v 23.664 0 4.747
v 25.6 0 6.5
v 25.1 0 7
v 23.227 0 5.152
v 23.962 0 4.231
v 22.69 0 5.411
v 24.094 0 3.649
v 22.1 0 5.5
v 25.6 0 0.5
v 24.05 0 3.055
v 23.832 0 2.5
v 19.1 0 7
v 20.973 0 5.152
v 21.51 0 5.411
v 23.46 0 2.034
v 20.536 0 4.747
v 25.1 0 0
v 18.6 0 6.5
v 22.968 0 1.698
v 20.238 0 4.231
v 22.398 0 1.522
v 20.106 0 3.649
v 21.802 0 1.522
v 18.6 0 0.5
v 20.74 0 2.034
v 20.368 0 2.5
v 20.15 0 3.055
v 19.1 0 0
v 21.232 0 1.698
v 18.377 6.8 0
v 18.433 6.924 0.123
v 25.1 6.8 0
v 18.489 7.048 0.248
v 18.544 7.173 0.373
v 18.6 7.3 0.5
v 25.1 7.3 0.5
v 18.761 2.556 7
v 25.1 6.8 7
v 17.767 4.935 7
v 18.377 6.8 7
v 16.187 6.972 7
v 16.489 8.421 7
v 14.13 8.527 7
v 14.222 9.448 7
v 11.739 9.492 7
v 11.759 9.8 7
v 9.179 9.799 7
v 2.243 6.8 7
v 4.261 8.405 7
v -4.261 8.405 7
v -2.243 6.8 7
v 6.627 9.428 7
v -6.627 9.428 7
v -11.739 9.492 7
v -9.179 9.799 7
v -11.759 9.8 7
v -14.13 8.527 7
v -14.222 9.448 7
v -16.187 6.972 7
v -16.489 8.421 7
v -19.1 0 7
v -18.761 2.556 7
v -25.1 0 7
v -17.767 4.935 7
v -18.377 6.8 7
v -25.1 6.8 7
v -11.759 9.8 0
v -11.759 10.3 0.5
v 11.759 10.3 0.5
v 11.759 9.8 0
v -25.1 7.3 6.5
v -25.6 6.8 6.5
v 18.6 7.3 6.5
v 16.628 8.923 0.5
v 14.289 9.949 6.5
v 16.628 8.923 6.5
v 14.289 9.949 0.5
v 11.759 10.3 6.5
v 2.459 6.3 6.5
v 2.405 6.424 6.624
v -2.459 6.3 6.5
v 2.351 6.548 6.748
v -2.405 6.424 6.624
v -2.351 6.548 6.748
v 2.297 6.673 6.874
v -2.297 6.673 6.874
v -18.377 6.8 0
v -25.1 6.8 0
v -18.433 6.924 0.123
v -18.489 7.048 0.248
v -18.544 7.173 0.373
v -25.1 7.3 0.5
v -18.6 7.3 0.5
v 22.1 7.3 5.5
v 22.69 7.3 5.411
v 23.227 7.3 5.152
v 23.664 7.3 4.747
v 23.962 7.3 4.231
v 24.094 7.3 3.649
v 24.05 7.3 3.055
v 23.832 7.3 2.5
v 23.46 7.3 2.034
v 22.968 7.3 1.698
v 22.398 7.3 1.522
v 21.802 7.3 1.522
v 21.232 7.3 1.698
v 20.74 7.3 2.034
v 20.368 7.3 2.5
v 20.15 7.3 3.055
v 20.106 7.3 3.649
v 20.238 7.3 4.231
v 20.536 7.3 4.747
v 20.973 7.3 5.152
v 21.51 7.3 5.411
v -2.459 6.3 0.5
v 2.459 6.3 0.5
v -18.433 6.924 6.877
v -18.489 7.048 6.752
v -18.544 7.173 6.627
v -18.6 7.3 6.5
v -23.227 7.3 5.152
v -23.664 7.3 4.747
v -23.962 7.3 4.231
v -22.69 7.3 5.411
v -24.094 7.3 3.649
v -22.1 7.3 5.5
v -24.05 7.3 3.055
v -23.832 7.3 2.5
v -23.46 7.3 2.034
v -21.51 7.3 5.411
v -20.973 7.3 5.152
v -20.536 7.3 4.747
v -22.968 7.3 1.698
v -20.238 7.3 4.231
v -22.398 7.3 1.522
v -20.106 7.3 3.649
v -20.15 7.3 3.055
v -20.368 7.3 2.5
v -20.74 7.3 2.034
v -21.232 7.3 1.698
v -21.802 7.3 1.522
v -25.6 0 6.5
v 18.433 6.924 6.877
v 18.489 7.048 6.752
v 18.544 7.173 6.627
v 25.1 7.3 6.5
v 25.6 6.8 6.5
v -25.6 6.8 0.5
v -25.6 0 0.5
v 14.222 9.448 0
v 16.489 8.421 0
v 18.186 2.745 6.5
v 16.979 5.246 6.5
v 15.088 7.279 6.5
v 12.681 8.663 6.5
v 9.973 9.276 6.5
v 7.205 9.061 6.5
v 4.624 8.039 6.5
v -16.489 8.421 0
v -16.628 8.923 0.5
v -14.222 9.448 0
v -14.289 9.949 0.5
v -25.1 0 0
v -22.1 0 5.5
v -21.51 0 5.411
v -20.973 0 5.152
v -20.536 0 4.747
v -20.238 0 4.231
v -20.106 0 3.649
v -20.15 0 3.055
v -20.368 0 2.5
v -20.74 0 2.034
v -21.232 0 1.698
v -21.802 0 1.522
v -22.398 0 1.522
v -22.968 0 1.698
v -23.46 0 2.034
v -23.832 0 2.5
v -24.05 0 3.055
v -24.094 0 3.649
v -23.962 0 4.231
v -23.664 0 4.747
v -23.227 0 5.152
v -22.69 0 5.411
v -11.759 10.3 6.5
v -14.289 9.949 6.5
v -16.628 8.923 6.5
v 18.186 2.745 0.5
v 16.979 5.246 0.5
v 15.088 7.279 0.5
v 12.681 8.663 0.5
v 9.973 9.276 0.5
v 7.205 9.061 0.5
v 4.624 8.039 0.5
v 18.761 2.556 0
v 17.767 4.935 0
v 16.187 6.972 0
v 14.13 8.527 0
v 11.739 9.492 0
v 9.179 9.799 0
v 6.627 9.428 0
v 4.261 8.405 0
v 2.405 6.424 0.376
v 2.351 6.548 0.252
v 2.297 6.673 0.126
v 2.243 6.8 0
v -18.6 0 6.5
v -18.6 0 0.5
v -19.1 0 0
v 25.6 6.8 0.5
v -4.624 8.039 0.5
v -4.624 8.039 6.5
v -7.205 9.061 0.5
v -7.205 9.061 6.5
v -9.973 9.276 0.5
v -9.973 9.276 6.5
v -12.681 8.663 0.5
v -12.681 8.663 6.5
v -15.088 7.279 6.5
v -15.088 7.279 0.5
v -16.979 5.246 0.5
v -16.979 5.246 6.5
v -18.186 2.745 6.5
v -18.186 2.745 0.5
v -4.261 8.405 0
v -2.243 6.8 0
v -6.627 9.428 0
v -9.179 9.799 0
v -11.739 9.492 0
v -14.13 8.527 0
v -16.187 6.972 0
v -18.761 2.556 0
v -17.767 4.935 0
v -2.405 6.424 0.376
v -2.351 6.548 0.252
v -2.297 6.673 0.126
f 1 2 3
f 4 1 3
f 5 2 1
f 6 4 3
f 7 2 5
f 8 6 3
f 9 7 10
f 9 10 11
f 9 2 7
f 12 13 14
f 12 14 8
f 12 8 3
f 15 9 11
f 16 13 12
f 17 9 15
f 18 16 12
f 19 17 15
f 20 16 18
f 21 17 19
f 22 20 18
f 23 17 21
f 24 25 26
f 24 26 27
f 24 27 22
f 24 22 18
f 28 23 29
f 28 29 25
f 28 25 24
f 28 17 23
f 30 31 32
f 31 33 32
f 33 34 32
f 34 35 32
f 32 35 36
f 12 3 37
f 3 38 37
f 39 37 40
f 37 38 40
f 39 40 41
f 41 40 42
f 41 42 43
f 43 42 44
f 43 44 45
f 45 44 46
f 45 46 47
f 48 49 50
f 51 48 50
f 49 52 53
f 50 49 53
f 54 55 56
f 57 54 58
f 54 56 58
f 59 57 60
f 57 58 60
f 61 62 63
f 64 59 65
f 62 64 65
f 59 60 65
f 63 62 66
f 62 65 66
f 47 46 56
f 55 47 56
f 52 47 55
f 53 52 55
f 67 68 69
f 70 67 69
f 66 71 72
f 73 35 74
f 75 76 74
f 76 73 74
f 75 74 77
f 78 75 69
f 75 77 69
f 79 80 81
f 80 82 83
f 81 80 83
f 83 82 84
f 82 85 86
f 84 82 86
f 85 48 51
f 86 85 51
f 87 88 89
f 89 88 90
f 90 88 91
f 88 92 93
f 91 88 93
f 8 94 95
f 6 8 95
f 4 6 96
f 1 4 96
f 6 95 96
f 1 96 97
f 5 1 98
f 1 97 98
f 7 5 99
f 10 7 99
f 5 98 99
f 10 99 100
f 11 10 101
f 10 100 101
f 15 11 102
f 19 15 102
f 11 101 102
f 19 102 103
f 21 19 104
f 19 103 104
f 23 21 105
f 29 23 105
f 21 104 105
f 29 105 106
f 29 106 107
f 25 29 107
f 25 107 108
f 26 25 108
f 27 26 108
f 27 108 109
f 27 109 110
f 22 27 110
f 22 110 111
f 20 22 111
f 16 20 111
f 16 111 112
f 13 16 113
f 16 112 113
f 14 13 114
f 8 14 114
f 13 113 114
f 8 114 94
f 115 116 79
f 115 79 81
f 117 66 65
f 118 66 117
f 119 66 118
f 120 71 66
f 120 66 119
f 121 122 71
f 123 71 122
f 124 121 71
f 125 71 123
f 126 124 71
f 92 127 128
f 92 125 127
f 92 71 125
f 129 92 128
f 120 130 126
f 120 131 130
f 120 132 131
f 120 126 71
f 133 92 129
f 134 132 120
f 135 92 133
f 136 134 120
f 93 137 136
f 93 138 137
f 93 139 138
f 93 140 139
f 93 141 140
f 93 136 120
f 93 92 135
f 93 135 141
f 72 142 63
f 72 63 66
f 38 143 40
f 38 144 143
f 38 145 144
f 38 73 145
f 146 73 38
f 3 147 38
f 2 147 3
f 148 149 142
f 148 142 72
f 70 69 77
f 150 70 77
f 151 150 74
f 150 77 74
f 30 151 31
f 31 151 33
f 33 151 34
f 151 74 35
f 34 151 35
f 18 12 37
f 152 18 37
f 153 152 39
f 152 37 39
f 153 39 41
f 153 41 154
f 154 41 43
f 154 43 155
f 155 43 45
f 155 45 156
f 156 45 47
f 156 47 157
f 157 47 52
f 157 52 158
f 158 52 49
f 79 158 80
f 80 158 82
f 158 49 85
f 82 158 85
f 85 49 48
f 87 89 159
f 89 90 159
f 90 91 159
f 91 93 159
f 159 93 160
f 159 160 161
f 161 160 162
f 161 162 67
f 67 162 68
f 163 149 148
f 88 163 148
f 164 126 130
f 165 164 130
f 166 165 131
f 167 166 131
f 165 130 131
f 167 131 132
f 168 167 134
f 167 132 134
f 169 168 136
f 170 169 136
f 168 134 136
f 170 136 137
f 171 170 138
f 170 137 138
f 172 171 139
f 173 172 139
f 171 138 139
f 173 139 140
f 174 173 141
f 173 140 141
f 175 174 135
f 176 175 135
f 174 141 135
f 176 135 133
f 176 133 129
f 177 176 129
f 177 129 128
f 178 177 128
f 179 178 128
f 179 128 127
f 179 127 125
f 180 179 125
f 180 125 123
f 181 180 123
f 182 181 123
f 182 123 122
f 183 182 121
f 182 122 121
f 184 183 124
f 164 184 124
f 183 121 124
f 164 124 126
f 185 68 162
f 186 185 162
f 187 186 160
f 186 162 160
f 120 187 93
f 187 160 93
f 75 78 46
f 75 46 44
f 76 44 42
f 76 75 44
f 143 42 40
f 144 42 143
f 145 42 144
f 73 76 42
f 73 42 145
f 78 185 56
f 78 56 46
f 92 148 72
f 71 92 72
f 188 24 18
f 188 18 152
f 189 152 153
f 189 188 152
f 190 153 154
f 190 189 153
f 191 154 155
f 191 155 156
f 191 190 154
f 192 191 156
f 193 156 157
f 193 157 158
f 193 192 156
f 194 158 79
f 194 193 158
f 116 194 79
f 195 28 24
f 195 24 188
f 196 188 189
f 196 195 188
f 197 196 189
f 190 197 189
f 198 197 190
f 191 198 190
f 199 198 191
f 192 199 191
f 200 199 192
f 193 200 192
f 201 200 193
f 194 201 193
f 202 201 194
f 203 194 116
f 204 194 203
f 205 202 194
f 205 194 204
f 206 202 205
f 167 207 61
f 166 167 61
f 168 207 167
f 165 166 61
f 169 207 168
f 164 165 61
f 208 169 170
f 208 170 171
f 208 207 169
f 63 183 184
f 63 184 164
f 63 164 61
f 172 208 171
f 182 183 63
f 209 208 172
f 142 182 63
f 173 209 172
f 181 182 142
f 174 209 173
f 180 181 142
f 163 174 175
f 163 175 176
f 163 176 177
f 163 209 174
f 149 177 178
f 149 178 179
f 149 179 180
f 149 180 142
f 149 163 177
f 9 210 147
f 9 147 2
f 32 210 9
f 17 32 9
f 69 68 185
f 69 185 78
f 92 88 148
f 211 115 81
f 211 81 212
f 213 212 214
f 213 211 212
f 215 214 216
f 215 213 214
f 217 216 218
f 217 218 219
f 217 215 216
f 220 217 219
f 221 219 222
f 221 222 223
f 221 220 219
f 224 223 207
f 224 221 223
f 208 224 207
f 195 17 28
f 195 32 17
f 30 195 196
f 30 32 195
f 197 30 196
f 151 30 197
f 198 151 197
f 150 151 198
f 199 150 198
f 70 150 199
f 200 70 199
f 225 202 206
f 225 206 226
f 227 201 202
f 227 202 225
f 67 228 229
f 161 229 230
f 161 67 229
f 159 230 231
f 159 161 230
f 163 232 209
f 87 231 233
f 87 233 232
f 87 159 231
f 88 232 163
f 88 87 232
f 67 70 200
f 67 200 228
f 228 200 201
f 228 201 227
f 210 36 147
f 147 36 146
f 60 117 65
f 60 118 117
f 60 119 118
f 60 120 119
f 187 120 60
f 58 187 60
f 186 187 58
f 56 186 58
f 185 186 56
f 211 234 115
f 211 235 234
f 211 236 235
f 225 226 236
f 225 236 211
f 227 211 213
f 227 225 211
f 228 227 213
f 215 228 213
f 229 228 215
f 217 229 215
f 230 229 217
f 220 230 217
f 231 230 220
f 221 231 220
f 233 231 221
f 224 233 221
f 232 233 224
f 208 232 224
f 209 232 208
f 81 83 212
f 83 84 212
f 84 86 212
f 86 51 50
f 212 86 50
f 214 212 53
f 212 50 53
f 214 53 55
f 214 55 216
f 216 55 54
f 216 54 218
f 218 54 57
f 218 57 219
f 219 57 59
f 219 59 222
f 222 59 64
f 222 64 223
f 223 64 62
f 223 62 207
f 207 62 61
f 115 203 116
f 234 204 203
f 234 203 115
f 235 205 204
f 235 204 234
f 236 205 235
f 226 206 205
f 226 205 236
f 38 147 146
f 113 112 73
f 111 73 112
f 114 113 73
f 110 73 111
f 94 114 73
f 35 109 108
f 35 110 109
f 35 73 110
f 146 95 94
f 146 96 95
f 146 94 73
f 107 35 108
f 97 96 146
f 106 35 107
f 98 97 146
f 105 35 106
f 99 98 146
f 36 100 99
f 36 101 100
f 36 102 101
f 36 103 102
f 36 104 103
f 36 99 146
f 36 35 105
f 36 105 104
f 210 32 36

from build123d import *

# Parameters (mm, degrees)
SALIENTE_EXTRUIR1_DEPTH = 7
CROQUIS2_R              = 2
CORTAR_EXTRUIR1_DEPTH   = 7.3
REDONDEO1_R             = 9.3
CHAFL_N1_SIZE           = 0.5


# Some blends are built 0.0001 mm under size
with BuildPart() as part:
    # Croquis1 → Saliente-Extruir1 (new body)
    with BuildSketch(Plane.XY):
        with BuildLine():
            Line((2.458947449, 6.3), (-2.458947449, 6.3))
            ThreePointArc((-2.458947449, 6.3), (-12.681435441, 8.663480499), (-18.6, 0))
            Line((-18.6, 0), (-25.6, 0))
            Line((-25.6, 0), (-25.6, 7.3))
            Line((-25.6, 7.3), (-18.6, 7.3))
            Line((-18.6, 7.3), (-18.6, 10.3))
            Line((-18.6, 10.3), (18.6, 10.3))
            Line((18.6, 10.3), (18.6, 7.3))
            Line((18.6, 7.3), (25.6, 7.3))
            Line((25.6, 7.3), (25.6, 0))
            Line((25.6, 0), (18.6, 0))
            ThreePointArc((18.6, 0), (12.681435441, 8.663480499), (2.458947449, 6.3))
        make_face()
    extrude(amount=SALIENTE_EXTRUIR1_DEPTH)

    # Croquis2 → Cortar-Extruir1 (cut)
    with BuildSketch(Plane(origin=(0, 7.3, 0), x_dir=(1, 0, 0), z_dir=(0, 1, 0))):
        with Locations(Location((22.1, -3.5, 0), (0, 0, 270))):
            Circle(CROQUIS2_R)
        with Locations(Location((-22.1, -3.5, 0), (0, 0, 270))):
            Circle(CROQUIS2_R)
    extrude(amount=-CORTAR_EXTRUIR1_DEPTH, mode=Mode.SUBTRACT)

    # Redondeo1
    # the kernel refuses this fillet: 9.3 mm, written as the material it takes off along each edge
    with BuildSketch(Plane(origin=(-18.6, 10.3, -17.102631376), x_dir=(0, -1, 0), z_dir=(0, 0, 1))) as redondeo1_piece_1:
        with BuildLine():
            CenterArc((9.3, 6.841052551), REDONDEO1_R, 180, 47.35769002)
            Line((0, 6.841052551), (-0.186, 6.841052551))
            Line((-0.186, 6.841052551), (-0.186, 0))
            Line((-0.186, 0), (0, -0.186))
            ThreePointArc((0, -0.186), (1.5, -0.186), (2.874, -0.136821051))
            Line((2.874, -0.136821051), (3, 0))
        make_face()
    extrude(amount=41.205262753, mode=Mode.SUBTRACT)
    with BuildSketch(Plane(origin=(18.6, 10.3, -17.102631376), x_dir=(-1, 0, 0), z_dir=(0, 0, 1))) as redondeo1_piece_2:
        with BuildLine():
            CenterArc((6.841052551, 9.3), REDONDEO1_R, 222.64230998, 47.35769002)
            Line((0, 3), (-0.136821051, 2.874))
            ThreePointArc((-0.136821051, 2.874), (-0.186, 1.5), (-0.186, 0))
            Line((-0.186, 0), (0, -0.186))
            Line((0, -0.186), (6.841052551, -0.186))
            Line((6.841052551, -0.186), (6.841052551, 0))
        make_face()
    extrude(amount=41.205262753, mode=Mode.SUBTRACT)

    # Chaflán1
    chafl_n1_edges = [part.edges().sort_by_distance(p)[0] for p in [
        (12.681435441, 8.663480499, 0),
        (0, 6.3, 0),
        (-12.681435441, 8.663480499, 0),
        (-25.6, 3.65, 0),
        (-22.1, 7.3, 0),
        (22.1, 7.3, 0),
        (25.6, 3.65, 0),
        (-22.1, 7.3, 7),
        (-25.6, 7.3, 3.5),
        (25.6, 7.3, 3.5),
        (-25.6, 3.65, 7),
        (-12.681435441, 8.663480499, 7),
        (0, 6.3, 7),
        (12.681435441, 8.663480499, 7),
        (25.6, 3.65, 7),
        (0, 10.3, 0),
        (15.493917329, 9.51704174, 0),
        (-15.493917329, 9.51704174, 0),
        (0, 10.3, 7),
        (15.493917329, 9.51704174, 7),
        (-15.493917329, 9.51704174, 7),
        (22.1, 7.3, 7),
    ]]
    chamfer(chafl_n1_edges, length=CHAFL_N1_SIZE - 0.0001)  # a hair under: the kernel refuses the full size


solid = part.part
